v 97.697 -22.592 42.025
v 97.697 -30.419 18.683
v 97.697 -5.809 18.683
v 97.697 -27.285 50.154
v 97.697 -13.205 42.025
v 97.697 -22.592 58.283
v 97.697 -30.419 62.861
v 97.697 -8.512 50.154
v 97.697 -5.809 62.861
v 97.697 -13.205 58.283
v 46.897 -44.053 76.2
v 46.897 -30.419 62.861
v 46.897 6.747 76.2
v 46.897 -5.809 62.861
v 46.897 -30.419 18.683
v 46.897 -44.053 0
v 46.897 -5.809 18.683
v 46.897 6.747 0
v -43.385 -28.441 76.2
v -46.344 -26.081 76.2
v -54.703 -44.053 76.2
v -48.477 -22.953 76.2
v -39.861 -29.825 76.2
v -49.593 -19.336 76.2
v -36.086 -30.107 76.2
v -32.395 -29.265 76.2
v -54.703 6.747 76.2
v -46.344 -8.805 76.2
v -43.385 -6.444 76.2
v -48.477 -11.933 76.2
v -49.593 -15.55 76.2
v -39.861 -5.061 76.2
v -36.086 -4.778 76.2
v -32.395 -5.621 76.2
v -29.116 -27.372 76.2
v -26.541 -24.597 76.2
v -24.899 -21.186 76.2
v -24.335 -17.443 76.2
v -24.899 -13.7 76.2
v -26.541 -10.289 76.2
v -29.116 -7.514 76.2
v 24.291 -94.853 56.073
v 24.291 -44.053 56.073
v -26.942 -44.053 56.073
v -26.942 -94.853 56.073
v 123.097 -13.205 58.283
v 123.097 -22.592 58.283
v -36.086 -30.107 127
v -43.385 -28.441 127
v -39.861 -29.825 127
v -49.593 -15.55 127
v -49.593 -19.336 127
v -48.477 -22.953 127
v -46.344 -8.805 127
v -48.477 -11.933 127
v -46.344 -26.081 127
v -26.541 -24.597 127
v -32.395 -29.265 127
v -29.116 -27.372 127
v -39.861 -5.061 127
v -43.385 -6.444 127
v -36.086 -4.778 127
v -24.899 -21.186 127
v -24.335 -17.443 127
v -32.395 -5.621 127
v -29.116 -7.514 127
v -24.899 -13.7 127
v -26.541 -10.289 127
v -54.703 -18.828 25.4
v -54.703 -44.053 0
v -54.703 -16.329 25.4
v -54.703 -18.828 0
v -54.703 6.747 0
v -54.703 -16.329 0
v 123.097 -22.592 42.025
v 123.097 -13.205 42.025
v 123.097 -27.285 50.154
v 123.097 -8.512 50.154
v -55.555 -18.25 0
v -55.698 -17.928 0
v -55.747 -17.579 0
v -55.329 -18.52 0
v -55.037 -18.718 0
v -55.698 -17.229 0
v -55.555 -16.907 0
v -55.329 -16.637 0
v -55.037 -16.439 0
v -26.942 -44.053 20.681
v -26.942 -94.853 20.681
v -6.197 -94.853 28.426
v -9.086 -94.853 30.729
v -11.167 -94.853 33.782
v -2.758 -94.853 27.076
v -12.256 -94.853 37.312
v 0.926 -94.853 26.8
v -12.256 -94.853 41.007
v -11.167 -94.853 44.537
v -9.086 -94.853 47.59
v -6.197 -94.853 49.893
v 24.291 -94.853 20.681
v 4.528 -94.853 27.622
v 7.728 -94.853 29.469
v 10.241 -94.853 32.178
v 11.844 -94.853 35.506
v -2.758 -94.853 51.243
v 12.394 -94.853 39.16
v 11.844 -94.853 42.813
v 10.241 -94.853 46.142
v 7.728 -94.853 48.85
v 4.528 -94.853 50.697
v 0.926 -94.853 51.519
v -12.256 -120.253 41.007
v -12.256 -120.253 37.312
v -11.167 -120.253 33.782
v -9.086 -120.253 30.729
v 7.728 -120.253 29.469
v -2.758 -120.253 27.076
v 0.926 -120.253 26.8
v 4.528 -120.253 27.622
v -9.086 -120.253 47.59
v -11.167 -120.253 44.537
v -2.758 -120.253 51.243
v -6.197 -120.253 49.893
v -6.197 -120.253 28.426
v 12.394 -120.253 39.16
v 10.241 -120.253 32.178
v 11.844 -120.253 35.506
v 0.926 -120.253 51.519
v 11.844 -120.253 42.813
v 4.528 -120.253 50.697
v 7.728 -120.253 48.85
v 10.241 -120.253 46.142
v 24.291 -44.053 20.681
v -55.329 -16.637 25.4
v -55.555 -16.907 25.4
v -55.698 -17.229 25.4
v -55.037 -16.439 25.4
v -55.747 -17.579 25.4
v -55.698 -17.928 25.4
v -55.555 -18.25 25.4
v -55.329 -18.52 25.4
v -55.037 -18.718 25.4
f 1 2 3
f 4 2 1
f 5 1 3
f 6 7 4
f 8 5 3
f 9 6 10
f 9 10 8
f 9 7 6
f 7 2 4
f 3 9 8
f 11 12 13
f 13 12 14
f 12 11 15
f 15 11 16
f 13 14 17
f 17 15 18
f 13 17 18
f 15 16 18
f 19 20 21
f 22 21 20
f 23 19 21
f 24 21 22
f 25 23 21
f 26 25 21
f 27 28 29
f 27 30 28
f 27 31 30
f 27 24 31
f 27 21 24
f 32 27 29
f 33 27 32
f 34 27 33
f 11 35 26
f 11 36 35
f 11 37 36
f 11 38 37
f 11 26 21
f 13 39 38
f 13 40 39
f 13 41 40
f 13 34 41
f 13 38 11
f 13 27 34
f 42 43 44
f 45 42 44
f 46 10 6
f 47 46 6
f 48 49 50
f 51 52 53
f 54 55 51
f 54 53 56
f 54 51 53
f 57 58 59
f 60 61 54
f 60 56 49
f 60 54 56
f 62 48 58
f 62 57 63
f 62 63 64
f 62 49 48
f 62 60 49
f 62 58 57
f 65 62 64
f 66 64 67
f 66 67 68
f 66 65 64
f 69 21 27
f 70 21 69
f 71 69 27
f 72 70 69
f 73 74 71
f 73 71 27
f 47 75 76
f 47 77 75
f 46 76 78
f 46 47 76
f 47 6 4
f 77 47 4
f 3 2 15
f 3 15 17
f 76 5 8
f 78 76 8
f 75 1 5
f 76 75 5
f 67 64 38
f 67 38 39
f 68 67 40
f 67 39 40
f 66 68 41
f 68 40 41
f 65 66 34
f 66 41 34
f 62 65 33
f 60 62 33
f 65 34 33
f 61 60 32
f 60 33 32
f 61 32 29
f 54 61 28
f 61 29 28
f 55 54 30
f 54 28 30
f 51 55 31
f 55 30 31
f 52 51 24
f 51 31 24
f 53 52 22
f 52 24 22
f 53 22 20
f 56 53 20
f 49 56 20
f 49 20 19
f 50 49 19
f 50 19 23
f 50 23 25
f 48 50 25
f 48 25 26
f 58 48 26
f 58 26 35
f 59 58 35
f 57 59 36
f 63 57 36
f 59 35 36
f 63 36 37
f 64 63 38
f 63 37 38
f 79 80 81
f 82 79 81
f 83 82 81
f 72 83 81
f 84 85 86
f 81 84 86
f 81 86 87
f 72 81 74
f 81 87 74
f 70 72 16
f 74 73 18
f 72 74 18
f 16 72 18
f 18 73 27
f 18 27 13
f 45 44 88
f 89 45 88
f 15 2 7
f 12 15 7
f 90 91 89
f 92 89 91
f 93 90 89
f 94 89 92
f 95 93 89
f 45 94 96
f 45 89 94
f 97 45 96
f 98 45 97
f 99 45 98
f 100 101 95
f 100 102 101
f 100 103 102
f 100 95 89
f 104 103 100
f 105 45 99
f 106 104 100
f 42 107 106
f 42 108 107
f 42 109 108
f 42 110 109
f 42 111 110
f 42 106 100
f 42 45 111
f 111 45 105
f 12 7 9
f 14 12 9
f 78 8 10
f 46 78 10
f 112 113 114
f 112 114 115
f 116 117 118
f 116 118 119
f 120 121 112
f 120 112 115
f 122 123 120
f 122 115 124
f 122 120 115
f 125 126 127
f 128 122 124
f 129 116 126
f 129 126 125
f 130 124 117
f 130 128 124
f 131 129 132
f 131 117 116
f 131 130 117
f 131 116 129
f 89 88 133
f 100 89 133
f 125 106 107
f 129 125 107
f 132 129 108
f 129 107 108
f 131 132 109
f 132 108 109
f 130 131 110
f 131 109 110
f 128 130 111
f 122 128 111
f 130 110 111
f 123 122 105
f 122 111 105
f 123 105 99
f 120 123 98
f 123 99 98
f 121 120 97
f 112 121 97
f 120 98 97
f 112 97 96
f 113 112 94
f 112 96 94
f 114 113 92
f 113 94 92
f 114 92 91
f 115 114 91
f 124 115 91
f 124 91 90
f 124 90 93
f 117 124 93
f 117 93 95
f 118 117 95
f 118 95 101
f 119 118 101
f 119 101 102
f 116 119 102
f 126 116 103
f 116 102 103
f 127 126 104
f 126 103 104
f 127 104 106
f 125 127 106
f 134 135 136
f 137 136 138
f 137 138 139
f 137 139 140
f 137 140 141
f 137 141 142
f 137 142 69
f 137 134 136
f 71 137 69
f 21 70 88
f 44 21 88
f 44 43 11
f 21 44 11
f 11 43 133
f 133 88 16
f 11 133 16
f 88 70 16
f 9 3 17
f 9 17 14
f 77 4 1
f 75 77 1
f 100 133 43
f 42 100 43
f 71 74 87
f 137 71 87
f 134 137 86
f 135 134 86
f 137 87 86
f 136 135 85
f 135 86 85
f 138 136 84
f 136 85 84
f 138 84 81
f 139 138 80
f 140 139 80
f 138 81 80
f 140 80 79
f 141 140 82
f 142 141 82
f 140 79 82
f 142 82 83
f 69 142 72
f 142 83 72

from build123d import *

# Parameters (mm, degrees)
F0_W      = 101.6
F0_H      = 50.8
F0_R      = 16.775178
F1_DEPTH  = 50.8
F2_R      = 1.27
F2_R_2    = 12.7
F1_FACE_W = 101.6
F1_FACE_H = 50.8
F3_DEPTH  = 25.4
F4_R      = 12.7
F5_DEPTH  = 50.8
F6_W      = 24.609506
F6_H      = 44.177586
F7_DEPTH  = 50.8
F9_DEPTH  = 25.4
F11_DEPTH = 50.8
F12_R     = 12.394387
F13_DEPTH = 25.4


with BuildPart() as f1:
    # F0 (on Top) → F1 (new body)
    with BuildSketch(Plane.XY):
        with Locations((-3.902643, -18.653006)):
            Rectangle(F0_W, F0_H)
        with Locations((-16.602643, -18.653006)):
            Circle(F0_R, mode=Mode.SUBTRACT)
        with Locations((-16.602643, -18.653006)):
            Circle(F0_R)
    extrude(amount=F1_DEPTH)

    # F2 (on Top) + F1_face (on face) → F3 (join)
    with BuildSketch(Plane.XY):
        with Locations((-54.476865, -17.57852)):
            Circle(F2_R)
        with Locations((-32.452784, -17.5102)):
            Circle(F2_R_2)
    with BuildSketch(Plane(origin=(-3.902643, -18.653006, 50.8), x_dir=(1, 0, 0), z_dir=(0, 0, 1))):
        Rectangle(F1_FACE_W, F1_FACE_H)
    extrude(amount=F3_DEPTH)

    # F4 (on face) → F5 (join)
    with BuildSketch(Plane.XY.offset(76.2)):
        with Locations((-37.034646, -17.442938)):
            Circle(F4_R)
    extrude(amount=F5_DEPTH)

    # F6 (on face) → F7 (join)
    with BuildSketch(Plane.YZ.offset(46.897357)):
        with Locations((-18.113753, 40.772016)):
            Rectangle(F6_W, F6_H)
    extrude(amount=F7_DEPTH)

    # F8 (on face) → F9 (join)
    with BuildSketch(Plane.YZ.offset(97.697357)):
        Polygon((-22.591917, 42.024732), (-13.205347, 42.024732), (-8.512062, 50.15374), (-13.205347, 58.282748), (-22.591917, 58.282748), (-27.285202, 50.15374), align=None)
    extrude(amount=F9_DEPTH)

    # F10 (on face) → F11 (join)
    with BuildSketch(Plane.XZ.offset(44.053006)):
        Polygon((24.291333, 56.072608), (-26.942033, 56.072608), (-26.942033, 20.681137), (9.460622, 20.681137), (24.291333, 20.681137), (24.291333, 32.478295), align=None)
    extrude(amount=F11_DEPTH)

    # F12 (on face) → F13 (join)
    with BuildSketch(Plane.XZ.offset(94.853006)):
        with Locations((0, 39.159566)):
            Circle(F12_R)
    extrude(amount=F13_DEPTH)


solid = f1.part
